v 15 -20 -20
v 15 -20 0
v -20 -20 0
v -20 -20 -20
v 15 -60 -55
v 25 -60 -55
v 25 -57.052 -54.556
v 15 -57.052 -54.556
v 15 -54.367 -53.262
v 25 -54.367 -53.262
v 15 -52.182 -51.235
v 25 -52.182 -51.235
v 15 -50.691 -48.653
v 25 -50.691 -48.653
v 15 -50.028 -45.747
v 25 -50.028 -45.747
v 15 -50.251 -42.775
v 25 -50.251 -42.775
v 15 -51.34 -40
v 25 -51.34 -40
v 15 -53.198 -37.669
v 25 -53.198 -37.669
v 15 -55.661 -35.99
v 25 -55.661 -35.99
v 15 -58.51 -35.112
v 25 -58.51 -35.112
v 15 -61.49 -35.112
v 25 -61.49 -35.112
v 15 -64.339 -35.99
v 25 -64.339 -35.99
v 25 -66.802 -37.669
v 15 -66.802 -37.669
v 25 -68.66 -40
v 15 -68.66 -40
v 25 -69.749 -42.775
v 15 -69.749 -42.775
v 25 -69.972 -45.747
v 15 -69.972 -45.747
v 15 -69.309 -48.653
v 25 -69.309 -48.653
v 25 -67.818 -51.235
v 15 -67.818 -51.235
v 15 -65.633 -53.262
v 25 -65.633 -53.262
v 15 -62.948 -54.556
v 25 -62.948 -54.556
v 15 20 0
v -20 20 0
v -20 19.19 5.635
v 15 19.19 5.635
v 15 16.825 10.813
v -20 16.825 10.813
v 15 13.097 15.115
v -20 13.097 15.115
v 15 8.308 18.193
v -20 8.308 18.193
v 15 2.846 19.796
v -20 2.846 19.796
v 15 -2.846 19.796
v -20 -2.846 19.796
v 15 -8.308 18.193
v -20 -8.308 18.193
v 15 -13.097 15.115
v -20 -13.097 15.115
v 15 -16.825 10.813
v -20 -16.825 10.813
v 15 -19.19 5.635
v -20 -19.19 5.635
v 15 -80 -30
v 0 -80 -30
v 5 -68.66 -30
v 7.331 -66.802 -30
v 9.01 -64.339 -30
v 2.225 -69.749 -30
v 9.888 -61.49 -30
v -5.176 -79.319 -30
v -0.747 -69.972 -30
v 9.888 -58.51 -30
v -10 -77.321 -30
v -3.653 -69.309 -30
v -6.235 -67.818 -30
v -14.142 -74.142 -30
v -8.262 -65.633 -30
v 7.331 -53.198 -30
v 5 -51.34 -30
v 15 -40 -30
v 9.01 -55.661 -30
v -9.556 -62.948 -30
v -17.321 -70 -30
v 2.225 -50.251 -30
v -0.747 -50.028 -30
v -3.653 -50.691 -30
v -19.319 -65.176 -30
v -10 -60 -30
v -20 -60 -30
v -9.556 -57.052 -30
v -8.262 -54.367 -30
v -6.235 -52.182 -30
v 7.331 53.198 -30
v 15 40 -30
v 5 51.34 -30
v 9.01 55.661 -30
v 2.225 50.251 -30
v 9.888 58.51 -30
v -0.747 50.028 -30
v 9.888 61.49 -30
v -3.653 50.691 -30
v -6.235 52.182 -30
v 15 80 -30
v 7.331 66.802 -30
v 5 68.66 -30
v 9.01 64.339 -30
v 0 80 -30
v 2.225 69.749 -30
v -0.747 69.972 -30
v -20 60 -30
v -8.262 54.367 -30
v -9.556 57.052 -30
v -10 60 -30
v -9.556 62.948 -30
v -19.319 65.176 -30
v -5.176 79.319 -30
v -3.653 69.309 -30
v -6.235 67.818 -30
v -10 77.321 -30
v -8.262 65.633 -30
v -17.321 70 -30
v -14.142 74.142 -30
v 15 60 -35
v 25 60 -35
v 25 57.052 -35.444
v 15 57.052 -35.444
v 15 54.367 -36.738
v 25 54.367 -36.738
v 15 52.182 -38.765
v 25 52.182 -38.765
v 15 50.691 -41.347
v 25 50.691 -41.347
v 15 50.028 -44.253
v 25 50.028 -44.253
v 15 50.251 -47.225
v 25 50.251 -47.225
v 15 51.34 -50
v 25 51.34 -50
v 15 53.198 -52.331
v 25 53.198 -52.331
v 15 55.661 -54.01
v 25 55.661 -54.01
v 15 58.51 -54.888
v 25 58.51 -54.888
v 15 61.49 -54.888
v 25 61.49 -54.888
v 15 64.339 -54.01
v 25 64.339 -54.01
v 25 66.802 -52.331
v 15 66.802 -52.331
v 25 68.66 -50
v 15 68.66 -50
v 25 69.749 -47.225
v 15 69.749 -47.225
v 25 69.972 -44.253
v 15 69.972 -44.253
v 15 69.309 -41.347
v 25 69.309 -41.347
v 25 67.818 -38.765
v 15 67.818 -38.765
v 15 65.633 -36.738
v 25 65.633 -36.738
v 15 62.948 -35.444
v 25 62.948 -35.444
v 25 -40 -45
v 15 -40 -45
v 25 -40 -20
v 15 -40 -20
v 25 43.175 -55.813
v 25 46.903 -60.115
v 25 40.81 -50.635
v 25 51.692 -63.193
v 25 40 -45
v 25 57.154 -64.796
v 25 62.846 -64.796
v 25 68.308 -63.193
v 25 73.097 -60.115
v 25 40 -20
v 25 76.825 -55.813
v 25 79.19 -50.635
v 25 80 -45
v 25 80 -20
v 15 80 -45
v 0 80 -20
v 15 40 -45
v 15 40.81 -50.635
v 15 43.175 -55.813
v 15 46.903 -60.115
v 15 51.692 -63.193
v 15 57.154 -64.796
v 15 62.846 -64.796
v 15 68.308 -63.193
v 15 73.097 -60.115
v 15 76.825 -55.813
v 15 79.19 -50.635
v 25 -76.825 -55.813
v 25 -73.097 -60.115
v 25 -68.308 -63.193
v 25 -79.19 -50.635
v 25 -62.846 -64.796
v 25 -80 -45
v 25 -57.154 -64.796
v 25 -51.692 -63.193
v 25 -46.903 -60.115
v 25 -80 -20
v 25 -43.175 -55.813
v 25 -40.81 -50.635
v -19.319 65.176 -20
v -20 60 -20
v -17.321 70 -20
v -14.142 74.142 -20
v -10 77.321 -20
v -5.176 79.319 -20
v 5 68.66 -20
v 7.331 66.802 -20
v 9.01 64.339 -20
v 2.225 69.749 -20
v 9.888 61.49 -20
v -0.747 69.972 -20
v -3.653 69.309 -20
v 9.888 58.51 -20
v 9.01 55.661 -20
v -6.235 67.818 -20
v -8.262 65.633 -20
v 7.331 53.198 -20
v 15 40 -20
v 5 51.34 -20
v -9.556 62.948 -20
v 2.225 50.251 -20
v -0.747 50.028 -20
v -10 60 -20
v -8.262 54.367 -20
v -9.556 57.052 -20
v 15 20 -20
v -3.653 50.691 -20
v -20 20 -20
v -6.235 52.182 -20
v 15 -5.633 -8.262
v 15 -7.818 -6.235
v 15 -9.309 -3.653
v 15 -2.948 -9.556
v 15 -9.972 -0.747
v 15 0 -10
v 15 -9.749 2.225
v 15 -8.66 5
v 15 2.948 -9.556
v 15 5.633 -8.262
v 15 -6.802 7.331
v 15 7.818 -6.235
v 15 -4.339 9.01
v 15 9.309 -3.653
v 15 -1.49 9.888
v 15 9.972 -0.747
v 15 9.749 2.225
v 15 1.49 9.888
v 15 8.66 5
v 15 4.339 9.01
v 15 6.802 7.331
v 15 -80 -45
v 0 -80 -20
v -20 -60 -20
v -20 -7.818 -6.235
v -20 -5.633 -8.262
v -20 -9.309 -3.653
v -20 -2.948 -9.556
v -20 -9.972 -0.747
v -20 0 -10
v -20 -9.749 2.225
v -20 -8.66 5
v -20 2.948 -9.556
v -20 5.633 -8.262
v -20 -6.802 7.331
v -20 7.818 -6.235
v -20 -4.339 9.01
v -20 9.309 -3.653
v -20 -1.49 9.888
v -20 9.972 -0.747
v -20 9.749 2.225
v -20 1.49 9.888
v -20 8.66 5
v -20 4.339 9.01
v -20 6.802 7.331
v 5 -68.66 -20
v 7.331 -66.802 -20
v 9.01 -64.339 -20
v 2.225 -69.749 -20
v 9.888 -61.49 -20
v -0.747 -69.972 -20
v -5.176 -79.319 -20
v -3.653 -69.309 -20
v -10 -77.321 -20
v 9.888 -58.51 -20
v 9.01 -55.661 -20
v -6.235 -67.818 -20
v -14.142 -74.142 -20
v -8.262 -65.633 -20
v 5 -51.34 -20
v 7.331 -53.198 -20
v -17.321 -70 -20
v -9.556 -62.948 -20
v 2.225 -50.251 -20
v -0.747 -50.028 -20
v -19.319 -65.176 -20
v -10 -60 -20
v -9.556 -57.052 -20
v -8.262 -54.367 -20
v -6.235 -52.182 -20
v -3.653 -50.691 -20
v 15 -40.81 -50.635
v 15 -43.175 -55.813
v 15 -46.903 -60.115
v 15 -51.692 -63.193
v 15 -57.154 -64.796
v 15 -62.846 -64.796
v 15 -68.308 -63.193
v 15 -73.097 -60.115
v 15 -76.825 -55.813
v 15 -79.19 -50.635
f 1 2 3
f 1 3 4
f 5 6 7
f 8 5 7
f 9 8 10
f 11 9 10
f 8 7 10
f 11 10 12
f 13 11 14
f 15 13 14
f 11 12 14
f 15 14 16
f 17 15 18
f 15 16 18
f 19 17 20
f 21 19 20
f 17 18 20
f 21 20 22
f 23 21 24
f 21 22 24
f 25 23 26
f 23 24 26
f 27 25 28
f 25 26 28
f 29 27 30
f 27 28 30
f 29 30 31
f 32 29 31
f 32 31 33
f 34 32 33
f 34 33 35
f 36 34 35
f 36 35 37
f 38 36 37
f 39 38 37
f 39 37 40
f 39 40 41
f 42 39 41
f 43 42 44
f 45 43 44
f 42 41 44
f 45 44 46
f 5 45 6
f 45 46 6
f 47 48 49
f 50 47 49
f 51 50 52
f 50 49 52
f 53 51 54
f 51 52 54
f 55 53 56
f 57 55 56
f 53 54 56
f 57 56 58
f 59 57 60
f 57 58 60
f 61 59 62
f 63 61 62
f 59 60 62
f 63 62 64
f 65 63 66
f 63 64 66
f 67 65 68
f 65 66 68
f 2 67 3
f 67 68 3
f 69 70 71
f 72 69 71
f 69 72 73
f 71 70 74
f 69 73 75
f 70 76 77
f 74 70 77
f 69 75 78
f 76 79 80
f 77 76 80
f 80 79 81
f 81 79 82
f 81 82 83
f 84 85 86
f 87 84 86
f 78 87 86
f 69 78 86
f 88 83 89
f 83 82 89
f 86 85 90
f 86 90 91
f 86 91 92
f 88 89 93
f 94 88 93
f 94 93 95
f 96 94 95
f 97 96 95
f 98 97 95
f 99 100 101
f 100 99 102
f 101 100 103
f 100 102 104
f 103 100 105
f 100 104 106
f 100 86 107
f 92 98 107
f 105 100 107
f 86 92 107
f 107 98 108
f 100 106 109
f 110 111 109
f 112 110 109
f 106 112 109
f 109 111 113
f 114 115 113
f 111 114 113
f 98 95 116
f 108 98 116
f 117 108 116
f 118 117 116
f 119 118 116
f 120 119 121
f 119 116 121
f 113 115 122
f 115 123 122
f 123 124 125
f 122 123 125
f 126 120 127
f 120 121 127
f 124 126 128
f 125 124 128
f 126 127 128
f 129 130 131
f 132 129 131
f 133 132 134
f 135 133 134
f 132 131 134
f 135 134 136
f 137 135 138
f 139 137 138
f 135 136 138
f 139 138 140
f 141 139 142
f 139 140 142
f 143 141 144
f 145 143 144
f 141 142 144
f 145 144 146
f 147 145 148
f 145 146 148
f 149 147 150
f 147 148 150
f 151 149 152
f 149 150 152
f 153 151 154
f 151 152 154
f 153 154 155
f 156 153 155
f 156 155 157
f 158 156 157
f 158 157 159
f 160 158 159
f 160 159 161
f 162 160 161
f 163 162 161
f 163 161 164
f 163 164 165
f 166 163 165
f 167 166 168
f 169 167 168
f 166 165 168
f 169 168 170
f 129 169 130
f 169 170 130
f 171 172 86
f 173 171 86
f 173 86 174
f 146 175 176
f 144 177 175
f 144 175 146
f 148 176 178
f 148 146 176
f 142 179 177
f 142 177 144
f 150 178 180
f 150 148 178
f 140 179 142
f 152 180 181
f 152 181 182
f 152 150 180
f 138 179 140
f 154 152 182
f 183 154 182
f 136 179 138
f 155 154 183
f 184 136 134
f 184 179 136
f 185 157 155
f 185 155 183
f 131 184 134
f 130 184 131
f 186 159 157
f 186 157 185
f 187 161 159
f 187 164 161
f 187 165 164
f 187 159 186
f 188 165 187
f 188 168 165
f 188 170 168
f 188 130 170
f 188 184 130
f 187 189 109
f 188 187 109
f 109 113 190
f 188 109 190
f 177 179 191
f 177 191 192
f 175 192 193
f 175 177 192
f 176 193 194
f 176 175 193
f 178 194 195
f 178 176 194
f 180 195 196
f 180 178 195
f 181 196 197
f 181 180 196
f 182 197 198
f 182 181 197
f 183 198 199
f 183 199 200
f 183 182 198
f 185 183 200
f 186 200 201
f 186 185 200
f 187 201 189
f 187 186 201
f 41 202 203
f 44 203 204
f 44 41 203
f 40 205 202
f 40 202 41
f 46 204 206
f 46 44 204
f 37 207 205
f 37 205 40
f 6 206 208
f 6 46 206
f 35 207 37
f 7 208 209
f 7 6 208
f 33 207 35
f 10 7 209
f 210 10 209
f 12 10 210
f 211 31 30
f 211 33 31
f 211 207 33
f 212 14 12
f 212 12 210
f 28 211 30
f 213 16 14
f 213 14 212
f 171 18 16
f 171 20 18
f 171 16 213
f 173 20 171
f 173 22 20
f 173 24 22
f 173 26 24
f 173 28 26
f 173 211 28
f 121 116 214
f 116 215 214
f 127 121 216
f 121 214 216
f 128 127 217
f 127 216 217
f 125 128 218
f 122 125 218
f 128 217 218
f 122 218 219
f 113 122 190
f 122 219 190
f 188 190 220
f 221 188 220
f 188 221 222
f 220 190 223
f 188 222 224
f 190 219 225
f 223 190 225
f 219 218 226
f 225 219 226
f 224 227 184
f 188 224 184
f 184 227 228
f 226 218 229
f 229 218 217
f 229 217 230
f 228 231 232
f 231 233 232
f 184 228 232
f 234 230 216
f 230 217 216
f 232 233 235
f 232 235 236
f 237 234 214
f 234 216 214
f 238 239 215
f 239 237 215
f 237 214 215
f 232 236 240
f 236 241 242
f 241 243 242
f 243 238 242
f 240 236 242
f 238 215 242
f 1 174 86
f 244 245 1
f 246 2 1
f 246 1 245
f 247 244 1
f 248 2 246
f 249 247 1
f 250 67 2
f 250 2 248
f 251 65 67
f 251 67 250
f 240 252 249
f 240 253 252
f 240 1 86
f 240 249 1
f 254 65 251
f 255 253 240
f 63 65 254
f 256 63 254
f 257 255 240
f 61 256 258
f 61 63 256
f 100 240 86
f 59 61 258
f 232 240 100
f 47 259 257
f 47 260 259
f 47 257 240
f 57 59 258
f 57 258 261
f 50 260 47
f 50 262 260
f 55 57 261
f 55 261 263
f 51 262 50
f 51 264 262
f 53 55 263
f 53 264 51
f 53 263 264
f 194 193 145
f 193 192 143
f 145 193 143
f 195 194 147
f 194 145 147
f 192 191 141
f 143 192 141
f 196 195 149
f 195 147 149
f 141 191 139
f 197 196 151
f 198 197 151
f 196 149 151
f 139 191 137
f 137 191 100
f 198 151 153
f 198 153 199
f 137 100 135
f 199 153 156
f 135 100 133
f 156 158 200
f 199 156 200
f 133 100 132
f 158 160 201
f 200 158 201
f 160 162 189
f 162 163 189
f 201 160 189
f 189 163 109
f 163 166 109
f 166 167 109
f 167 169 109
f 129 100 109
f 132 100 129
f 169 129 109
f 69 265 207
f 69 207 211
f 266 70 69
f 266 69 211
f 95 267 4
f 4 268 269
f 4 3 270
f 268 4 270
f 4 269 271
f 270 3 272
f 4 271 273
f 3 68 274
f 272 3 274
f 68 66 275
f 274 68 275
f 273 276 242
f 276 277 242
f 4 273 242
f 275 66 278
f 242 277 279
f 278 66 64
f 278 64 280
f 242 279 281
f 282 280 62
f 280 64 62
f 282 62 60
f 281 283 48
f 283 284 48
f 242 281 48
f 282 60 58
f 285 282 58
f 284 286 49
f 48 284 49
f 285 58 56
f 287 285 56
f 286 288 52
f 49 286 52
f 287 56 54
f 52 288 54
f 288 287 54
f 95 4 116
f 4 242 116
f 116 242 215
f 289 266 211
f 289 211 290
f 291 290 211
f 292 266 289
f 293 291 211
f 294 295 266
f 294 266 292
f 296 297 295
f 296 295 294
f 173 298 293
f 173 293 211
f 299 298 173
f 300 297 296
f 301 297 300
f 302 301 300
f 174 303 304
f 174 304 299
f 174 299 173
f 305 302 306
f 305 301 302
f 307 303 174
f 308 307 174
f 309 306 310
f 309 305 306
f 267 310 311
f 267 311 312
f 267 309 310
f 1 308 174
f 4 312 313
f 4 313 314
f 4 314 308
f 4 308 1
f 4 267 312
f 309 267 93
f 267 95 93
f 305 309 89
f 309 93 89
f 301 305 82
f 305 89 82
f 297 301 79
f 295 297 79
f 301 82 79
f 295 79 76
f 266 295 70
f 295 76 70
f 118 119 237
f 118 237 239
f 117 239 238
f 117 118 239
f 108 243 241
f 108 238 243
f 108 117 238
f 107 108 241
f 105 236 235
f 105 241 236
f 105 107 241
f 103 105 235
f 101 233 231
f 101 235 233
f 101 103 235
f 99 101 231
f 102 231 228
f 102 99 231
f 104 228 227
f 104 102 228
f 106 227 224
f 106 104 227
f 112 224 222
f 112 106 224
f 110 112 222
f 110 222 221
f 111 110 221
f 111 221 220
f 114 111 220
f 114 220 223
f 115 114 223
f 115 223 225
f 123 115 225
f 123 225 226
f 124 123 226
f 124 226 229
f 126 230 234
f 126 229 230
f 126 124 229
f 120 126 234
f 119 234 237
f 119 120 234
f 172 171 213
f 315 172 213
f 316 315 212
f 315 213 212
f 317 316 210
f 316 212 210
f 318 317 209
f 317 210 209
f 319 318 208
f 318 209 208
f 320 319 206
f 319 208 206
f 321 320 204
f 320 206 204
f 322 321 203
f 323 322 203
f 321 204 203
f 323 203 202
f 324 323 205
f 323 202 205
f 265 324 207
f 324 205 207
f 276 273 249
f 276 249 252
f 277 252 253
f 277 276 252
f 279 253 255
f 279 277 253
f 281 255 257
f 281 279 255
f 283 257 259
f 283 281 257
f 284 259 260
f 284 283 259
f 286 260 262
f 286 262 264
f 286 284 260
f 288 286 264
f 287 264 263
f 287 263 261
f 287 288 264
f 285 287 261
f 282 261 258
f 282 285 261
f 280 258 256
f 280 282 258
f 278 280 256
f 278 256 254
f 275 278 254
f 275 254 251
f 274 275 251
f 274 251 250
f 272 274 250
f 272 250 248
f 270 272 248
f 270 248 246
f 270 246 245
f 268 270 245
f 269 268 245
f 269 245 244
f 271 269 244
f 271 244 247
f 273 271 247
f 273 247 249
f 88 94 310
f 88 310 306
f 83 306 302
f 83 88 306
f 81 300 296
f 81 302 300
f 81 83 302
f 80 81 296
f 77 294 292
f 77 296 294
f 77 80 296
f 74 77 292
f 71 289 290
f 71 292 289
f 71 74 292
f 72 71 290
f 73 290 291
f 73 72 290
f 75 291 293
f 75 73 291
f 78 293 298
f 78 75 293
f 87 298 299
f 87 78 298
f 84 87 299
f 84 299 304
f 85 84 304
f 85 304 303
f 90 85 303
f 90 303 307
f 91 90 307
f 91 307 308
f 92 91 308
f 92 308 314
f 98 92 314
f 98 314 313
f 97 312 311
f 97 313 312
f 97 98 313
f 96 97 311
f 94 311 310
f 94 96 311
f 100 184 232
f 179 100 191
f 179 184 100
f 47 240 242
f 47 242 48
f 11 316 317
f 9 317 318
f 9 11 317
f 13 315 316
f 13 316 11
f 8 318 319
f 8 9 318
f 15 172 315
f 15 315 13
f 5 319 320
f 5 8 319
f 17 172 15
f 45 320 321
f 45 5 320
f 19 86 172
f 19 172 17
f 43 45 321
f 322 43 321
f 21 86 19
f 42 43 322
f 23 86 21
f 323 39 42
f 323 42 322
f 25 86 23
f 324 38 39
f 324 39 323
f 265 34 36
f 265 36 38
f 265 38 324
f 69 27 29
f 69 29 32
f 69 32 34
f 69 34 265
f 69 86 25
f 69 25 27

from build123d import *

# Parameters (mm, degrees)
BOSS_EXTRUDE1_DEPTH     = 20
BOSS_EXTRUDE2_DEPTH     = 15
SKETCH1_4_R             = 10
BOSS_EXTRUDE3_DEPTH     = 15
BOSS_EXTRUDE4_START     = -20
SKETCH1_5_R             = 10
BOSS_EXTRUDE4_DEPTH     = 20
FILLET1_R               = 20
SKETCH2_W               = 40
SKETCH2_H               = 10
BOSS_EXTRUDE5_DEPTH     = 10
SKETCH3_R               = 10
BOSS_EXTRUDE6_DEPTH     = 10
CUT_EXTRUDE1_DEPTH      = 107.066017178
CUT_EXTRUDE1_DEPTH_BACK = 107.066017178
SKETCH4_R               = 10


with BuildPart() as part:
    # Sketch1 → Boss-Extrude1 (new body)
    with BuildSketch(Plane.YZ):
        Polygon((20, -20), (-20, -20), (-80, -20), (-80, -30), (80, -30), (80, -20), align=None)
    extrude(amount=-BOSS_EXTRUDE1_DEPTH)

    # Sketch1<3> → Boss-Extrude2 (add)
    with BuildSketch(Plane.YZ):
        Polygon((20, -20), (-20, -20), (-80, -20), (-80, -30), (80, -30), (80, -20), align=None)
    extrude(amount=BOSS_EXTRUDE2_DEPTH)

    # Sketch1<4> → Boss-Extrude3 (add)
    with BuildSketch(Plane.YZ):
        with BuildLine():
            ThreePointArc((20, 0), (0, 20), (-20, 0))
            Line((-20, 0), (-20, -20))
            Line((-20, -20), (20, -20))
            Line((20, -20), (20, 0))
        make_face()
        Circle(SKETCH1_4_R, mode=Mode.SUBTRACT)
    extrude(amount=BOSS_EXTRUDE3_DEPTH)

    # Sketch1<5> → Boss-Extrude4 (add)
    with BuildSketch(Plane.YZ.offset(BOSS_EXTRUDE4_START)):
        with BuildLine():
            ThreePointArc((20, 0), (0, 20), (-20, 0))
            Line((-20, 0), (-20, -20))
            Line((-20, -20), (20, -20))
            Line((20, -20), (20, 0))
        make_face()
        Circle(SKETCH1_5_R, mode=Mode.SUBTRACT)
    extrude(amount=BOSS_EXTRUDE4_DEPTH)

    # Fillet1
    fillet1_edges = [part.edges().sort_by_distance(p)[0] for p in [
        (-20, 80, -25),
        (-20, -80, -25),
    ]]
    fillet(fillet1_edges, radius=FILLET1_R)

    # Sketch2 → Boss-Extrude5 (add)
    with BuildSketch(Plane.YZ.offset(15)):
        with Locations((-60, -25)):
            Rectangle(SKETCH2_W, SKETCH2_H)
        with Locations((60, -25)):
            Rectangle(SKETCH2_W, SKETCH2_H)
    extrude(amount=BOSS_EXTRUDE5_DEPTH)

    # Sketch3 → Boss-Extrude6 (add)
    # profile 1 of 2: a face of its own
    with BuildSketch(Plane.YZ.offset(25)):
        with BuildLine():
            Line((-80, -20), (-40, -20))
            Line((-40, -20), (-40, -45))
            ThreePointArc((-40, -45), (-60, -65), (-80, -45))
            Line((-80, -45), (-80, -20))
        make_face()
        with Locations((-60, -45)):
            Circle(SKETCH3_R, mode=Mode.SUBTRACT)
    # profile 2 of 2: a face of its own
    with BuildSketch(Plane.YZ.offset(25)):
        with BuildLine():
            Line((80, -45), (80, -20))
            Line((80, -20), (40, -20))
            Line((40, -20), (40, -45))
            ThreePointArc((40, -45), (60, -65), (80, -45))
        make_face()
        with Locations((60, -45)):
            Circle(SKETCH3_R, mode=Mode.SUBTRACT)
    extrude(amount=-BOSS_EXTRUDE6_DEPTH)

    # Sketch4 → Cut-Extrude1 (cut, two sides: drawn at the far end of the back side and taken through both)
    with BuildSketch(Plane(origin=(0, 0, 0), x_dir=(0, 1, 0), z_dir=(0, 0, 1)).offset(-CUT_EXTRUDE1_DEPTH_BACK)):
        with Locations((-60, 0)):
            Circle(SKETCH4_R)
        with Locations((60, 0)):
            Circle(SKETCH4_R)
    extrude(amount=CUT_EXTRUDE1_DEPTH + CUT_EXTRUDE1_DEPTH_BACK, mode=Mode.SUBTRACT)


solid = part.part
